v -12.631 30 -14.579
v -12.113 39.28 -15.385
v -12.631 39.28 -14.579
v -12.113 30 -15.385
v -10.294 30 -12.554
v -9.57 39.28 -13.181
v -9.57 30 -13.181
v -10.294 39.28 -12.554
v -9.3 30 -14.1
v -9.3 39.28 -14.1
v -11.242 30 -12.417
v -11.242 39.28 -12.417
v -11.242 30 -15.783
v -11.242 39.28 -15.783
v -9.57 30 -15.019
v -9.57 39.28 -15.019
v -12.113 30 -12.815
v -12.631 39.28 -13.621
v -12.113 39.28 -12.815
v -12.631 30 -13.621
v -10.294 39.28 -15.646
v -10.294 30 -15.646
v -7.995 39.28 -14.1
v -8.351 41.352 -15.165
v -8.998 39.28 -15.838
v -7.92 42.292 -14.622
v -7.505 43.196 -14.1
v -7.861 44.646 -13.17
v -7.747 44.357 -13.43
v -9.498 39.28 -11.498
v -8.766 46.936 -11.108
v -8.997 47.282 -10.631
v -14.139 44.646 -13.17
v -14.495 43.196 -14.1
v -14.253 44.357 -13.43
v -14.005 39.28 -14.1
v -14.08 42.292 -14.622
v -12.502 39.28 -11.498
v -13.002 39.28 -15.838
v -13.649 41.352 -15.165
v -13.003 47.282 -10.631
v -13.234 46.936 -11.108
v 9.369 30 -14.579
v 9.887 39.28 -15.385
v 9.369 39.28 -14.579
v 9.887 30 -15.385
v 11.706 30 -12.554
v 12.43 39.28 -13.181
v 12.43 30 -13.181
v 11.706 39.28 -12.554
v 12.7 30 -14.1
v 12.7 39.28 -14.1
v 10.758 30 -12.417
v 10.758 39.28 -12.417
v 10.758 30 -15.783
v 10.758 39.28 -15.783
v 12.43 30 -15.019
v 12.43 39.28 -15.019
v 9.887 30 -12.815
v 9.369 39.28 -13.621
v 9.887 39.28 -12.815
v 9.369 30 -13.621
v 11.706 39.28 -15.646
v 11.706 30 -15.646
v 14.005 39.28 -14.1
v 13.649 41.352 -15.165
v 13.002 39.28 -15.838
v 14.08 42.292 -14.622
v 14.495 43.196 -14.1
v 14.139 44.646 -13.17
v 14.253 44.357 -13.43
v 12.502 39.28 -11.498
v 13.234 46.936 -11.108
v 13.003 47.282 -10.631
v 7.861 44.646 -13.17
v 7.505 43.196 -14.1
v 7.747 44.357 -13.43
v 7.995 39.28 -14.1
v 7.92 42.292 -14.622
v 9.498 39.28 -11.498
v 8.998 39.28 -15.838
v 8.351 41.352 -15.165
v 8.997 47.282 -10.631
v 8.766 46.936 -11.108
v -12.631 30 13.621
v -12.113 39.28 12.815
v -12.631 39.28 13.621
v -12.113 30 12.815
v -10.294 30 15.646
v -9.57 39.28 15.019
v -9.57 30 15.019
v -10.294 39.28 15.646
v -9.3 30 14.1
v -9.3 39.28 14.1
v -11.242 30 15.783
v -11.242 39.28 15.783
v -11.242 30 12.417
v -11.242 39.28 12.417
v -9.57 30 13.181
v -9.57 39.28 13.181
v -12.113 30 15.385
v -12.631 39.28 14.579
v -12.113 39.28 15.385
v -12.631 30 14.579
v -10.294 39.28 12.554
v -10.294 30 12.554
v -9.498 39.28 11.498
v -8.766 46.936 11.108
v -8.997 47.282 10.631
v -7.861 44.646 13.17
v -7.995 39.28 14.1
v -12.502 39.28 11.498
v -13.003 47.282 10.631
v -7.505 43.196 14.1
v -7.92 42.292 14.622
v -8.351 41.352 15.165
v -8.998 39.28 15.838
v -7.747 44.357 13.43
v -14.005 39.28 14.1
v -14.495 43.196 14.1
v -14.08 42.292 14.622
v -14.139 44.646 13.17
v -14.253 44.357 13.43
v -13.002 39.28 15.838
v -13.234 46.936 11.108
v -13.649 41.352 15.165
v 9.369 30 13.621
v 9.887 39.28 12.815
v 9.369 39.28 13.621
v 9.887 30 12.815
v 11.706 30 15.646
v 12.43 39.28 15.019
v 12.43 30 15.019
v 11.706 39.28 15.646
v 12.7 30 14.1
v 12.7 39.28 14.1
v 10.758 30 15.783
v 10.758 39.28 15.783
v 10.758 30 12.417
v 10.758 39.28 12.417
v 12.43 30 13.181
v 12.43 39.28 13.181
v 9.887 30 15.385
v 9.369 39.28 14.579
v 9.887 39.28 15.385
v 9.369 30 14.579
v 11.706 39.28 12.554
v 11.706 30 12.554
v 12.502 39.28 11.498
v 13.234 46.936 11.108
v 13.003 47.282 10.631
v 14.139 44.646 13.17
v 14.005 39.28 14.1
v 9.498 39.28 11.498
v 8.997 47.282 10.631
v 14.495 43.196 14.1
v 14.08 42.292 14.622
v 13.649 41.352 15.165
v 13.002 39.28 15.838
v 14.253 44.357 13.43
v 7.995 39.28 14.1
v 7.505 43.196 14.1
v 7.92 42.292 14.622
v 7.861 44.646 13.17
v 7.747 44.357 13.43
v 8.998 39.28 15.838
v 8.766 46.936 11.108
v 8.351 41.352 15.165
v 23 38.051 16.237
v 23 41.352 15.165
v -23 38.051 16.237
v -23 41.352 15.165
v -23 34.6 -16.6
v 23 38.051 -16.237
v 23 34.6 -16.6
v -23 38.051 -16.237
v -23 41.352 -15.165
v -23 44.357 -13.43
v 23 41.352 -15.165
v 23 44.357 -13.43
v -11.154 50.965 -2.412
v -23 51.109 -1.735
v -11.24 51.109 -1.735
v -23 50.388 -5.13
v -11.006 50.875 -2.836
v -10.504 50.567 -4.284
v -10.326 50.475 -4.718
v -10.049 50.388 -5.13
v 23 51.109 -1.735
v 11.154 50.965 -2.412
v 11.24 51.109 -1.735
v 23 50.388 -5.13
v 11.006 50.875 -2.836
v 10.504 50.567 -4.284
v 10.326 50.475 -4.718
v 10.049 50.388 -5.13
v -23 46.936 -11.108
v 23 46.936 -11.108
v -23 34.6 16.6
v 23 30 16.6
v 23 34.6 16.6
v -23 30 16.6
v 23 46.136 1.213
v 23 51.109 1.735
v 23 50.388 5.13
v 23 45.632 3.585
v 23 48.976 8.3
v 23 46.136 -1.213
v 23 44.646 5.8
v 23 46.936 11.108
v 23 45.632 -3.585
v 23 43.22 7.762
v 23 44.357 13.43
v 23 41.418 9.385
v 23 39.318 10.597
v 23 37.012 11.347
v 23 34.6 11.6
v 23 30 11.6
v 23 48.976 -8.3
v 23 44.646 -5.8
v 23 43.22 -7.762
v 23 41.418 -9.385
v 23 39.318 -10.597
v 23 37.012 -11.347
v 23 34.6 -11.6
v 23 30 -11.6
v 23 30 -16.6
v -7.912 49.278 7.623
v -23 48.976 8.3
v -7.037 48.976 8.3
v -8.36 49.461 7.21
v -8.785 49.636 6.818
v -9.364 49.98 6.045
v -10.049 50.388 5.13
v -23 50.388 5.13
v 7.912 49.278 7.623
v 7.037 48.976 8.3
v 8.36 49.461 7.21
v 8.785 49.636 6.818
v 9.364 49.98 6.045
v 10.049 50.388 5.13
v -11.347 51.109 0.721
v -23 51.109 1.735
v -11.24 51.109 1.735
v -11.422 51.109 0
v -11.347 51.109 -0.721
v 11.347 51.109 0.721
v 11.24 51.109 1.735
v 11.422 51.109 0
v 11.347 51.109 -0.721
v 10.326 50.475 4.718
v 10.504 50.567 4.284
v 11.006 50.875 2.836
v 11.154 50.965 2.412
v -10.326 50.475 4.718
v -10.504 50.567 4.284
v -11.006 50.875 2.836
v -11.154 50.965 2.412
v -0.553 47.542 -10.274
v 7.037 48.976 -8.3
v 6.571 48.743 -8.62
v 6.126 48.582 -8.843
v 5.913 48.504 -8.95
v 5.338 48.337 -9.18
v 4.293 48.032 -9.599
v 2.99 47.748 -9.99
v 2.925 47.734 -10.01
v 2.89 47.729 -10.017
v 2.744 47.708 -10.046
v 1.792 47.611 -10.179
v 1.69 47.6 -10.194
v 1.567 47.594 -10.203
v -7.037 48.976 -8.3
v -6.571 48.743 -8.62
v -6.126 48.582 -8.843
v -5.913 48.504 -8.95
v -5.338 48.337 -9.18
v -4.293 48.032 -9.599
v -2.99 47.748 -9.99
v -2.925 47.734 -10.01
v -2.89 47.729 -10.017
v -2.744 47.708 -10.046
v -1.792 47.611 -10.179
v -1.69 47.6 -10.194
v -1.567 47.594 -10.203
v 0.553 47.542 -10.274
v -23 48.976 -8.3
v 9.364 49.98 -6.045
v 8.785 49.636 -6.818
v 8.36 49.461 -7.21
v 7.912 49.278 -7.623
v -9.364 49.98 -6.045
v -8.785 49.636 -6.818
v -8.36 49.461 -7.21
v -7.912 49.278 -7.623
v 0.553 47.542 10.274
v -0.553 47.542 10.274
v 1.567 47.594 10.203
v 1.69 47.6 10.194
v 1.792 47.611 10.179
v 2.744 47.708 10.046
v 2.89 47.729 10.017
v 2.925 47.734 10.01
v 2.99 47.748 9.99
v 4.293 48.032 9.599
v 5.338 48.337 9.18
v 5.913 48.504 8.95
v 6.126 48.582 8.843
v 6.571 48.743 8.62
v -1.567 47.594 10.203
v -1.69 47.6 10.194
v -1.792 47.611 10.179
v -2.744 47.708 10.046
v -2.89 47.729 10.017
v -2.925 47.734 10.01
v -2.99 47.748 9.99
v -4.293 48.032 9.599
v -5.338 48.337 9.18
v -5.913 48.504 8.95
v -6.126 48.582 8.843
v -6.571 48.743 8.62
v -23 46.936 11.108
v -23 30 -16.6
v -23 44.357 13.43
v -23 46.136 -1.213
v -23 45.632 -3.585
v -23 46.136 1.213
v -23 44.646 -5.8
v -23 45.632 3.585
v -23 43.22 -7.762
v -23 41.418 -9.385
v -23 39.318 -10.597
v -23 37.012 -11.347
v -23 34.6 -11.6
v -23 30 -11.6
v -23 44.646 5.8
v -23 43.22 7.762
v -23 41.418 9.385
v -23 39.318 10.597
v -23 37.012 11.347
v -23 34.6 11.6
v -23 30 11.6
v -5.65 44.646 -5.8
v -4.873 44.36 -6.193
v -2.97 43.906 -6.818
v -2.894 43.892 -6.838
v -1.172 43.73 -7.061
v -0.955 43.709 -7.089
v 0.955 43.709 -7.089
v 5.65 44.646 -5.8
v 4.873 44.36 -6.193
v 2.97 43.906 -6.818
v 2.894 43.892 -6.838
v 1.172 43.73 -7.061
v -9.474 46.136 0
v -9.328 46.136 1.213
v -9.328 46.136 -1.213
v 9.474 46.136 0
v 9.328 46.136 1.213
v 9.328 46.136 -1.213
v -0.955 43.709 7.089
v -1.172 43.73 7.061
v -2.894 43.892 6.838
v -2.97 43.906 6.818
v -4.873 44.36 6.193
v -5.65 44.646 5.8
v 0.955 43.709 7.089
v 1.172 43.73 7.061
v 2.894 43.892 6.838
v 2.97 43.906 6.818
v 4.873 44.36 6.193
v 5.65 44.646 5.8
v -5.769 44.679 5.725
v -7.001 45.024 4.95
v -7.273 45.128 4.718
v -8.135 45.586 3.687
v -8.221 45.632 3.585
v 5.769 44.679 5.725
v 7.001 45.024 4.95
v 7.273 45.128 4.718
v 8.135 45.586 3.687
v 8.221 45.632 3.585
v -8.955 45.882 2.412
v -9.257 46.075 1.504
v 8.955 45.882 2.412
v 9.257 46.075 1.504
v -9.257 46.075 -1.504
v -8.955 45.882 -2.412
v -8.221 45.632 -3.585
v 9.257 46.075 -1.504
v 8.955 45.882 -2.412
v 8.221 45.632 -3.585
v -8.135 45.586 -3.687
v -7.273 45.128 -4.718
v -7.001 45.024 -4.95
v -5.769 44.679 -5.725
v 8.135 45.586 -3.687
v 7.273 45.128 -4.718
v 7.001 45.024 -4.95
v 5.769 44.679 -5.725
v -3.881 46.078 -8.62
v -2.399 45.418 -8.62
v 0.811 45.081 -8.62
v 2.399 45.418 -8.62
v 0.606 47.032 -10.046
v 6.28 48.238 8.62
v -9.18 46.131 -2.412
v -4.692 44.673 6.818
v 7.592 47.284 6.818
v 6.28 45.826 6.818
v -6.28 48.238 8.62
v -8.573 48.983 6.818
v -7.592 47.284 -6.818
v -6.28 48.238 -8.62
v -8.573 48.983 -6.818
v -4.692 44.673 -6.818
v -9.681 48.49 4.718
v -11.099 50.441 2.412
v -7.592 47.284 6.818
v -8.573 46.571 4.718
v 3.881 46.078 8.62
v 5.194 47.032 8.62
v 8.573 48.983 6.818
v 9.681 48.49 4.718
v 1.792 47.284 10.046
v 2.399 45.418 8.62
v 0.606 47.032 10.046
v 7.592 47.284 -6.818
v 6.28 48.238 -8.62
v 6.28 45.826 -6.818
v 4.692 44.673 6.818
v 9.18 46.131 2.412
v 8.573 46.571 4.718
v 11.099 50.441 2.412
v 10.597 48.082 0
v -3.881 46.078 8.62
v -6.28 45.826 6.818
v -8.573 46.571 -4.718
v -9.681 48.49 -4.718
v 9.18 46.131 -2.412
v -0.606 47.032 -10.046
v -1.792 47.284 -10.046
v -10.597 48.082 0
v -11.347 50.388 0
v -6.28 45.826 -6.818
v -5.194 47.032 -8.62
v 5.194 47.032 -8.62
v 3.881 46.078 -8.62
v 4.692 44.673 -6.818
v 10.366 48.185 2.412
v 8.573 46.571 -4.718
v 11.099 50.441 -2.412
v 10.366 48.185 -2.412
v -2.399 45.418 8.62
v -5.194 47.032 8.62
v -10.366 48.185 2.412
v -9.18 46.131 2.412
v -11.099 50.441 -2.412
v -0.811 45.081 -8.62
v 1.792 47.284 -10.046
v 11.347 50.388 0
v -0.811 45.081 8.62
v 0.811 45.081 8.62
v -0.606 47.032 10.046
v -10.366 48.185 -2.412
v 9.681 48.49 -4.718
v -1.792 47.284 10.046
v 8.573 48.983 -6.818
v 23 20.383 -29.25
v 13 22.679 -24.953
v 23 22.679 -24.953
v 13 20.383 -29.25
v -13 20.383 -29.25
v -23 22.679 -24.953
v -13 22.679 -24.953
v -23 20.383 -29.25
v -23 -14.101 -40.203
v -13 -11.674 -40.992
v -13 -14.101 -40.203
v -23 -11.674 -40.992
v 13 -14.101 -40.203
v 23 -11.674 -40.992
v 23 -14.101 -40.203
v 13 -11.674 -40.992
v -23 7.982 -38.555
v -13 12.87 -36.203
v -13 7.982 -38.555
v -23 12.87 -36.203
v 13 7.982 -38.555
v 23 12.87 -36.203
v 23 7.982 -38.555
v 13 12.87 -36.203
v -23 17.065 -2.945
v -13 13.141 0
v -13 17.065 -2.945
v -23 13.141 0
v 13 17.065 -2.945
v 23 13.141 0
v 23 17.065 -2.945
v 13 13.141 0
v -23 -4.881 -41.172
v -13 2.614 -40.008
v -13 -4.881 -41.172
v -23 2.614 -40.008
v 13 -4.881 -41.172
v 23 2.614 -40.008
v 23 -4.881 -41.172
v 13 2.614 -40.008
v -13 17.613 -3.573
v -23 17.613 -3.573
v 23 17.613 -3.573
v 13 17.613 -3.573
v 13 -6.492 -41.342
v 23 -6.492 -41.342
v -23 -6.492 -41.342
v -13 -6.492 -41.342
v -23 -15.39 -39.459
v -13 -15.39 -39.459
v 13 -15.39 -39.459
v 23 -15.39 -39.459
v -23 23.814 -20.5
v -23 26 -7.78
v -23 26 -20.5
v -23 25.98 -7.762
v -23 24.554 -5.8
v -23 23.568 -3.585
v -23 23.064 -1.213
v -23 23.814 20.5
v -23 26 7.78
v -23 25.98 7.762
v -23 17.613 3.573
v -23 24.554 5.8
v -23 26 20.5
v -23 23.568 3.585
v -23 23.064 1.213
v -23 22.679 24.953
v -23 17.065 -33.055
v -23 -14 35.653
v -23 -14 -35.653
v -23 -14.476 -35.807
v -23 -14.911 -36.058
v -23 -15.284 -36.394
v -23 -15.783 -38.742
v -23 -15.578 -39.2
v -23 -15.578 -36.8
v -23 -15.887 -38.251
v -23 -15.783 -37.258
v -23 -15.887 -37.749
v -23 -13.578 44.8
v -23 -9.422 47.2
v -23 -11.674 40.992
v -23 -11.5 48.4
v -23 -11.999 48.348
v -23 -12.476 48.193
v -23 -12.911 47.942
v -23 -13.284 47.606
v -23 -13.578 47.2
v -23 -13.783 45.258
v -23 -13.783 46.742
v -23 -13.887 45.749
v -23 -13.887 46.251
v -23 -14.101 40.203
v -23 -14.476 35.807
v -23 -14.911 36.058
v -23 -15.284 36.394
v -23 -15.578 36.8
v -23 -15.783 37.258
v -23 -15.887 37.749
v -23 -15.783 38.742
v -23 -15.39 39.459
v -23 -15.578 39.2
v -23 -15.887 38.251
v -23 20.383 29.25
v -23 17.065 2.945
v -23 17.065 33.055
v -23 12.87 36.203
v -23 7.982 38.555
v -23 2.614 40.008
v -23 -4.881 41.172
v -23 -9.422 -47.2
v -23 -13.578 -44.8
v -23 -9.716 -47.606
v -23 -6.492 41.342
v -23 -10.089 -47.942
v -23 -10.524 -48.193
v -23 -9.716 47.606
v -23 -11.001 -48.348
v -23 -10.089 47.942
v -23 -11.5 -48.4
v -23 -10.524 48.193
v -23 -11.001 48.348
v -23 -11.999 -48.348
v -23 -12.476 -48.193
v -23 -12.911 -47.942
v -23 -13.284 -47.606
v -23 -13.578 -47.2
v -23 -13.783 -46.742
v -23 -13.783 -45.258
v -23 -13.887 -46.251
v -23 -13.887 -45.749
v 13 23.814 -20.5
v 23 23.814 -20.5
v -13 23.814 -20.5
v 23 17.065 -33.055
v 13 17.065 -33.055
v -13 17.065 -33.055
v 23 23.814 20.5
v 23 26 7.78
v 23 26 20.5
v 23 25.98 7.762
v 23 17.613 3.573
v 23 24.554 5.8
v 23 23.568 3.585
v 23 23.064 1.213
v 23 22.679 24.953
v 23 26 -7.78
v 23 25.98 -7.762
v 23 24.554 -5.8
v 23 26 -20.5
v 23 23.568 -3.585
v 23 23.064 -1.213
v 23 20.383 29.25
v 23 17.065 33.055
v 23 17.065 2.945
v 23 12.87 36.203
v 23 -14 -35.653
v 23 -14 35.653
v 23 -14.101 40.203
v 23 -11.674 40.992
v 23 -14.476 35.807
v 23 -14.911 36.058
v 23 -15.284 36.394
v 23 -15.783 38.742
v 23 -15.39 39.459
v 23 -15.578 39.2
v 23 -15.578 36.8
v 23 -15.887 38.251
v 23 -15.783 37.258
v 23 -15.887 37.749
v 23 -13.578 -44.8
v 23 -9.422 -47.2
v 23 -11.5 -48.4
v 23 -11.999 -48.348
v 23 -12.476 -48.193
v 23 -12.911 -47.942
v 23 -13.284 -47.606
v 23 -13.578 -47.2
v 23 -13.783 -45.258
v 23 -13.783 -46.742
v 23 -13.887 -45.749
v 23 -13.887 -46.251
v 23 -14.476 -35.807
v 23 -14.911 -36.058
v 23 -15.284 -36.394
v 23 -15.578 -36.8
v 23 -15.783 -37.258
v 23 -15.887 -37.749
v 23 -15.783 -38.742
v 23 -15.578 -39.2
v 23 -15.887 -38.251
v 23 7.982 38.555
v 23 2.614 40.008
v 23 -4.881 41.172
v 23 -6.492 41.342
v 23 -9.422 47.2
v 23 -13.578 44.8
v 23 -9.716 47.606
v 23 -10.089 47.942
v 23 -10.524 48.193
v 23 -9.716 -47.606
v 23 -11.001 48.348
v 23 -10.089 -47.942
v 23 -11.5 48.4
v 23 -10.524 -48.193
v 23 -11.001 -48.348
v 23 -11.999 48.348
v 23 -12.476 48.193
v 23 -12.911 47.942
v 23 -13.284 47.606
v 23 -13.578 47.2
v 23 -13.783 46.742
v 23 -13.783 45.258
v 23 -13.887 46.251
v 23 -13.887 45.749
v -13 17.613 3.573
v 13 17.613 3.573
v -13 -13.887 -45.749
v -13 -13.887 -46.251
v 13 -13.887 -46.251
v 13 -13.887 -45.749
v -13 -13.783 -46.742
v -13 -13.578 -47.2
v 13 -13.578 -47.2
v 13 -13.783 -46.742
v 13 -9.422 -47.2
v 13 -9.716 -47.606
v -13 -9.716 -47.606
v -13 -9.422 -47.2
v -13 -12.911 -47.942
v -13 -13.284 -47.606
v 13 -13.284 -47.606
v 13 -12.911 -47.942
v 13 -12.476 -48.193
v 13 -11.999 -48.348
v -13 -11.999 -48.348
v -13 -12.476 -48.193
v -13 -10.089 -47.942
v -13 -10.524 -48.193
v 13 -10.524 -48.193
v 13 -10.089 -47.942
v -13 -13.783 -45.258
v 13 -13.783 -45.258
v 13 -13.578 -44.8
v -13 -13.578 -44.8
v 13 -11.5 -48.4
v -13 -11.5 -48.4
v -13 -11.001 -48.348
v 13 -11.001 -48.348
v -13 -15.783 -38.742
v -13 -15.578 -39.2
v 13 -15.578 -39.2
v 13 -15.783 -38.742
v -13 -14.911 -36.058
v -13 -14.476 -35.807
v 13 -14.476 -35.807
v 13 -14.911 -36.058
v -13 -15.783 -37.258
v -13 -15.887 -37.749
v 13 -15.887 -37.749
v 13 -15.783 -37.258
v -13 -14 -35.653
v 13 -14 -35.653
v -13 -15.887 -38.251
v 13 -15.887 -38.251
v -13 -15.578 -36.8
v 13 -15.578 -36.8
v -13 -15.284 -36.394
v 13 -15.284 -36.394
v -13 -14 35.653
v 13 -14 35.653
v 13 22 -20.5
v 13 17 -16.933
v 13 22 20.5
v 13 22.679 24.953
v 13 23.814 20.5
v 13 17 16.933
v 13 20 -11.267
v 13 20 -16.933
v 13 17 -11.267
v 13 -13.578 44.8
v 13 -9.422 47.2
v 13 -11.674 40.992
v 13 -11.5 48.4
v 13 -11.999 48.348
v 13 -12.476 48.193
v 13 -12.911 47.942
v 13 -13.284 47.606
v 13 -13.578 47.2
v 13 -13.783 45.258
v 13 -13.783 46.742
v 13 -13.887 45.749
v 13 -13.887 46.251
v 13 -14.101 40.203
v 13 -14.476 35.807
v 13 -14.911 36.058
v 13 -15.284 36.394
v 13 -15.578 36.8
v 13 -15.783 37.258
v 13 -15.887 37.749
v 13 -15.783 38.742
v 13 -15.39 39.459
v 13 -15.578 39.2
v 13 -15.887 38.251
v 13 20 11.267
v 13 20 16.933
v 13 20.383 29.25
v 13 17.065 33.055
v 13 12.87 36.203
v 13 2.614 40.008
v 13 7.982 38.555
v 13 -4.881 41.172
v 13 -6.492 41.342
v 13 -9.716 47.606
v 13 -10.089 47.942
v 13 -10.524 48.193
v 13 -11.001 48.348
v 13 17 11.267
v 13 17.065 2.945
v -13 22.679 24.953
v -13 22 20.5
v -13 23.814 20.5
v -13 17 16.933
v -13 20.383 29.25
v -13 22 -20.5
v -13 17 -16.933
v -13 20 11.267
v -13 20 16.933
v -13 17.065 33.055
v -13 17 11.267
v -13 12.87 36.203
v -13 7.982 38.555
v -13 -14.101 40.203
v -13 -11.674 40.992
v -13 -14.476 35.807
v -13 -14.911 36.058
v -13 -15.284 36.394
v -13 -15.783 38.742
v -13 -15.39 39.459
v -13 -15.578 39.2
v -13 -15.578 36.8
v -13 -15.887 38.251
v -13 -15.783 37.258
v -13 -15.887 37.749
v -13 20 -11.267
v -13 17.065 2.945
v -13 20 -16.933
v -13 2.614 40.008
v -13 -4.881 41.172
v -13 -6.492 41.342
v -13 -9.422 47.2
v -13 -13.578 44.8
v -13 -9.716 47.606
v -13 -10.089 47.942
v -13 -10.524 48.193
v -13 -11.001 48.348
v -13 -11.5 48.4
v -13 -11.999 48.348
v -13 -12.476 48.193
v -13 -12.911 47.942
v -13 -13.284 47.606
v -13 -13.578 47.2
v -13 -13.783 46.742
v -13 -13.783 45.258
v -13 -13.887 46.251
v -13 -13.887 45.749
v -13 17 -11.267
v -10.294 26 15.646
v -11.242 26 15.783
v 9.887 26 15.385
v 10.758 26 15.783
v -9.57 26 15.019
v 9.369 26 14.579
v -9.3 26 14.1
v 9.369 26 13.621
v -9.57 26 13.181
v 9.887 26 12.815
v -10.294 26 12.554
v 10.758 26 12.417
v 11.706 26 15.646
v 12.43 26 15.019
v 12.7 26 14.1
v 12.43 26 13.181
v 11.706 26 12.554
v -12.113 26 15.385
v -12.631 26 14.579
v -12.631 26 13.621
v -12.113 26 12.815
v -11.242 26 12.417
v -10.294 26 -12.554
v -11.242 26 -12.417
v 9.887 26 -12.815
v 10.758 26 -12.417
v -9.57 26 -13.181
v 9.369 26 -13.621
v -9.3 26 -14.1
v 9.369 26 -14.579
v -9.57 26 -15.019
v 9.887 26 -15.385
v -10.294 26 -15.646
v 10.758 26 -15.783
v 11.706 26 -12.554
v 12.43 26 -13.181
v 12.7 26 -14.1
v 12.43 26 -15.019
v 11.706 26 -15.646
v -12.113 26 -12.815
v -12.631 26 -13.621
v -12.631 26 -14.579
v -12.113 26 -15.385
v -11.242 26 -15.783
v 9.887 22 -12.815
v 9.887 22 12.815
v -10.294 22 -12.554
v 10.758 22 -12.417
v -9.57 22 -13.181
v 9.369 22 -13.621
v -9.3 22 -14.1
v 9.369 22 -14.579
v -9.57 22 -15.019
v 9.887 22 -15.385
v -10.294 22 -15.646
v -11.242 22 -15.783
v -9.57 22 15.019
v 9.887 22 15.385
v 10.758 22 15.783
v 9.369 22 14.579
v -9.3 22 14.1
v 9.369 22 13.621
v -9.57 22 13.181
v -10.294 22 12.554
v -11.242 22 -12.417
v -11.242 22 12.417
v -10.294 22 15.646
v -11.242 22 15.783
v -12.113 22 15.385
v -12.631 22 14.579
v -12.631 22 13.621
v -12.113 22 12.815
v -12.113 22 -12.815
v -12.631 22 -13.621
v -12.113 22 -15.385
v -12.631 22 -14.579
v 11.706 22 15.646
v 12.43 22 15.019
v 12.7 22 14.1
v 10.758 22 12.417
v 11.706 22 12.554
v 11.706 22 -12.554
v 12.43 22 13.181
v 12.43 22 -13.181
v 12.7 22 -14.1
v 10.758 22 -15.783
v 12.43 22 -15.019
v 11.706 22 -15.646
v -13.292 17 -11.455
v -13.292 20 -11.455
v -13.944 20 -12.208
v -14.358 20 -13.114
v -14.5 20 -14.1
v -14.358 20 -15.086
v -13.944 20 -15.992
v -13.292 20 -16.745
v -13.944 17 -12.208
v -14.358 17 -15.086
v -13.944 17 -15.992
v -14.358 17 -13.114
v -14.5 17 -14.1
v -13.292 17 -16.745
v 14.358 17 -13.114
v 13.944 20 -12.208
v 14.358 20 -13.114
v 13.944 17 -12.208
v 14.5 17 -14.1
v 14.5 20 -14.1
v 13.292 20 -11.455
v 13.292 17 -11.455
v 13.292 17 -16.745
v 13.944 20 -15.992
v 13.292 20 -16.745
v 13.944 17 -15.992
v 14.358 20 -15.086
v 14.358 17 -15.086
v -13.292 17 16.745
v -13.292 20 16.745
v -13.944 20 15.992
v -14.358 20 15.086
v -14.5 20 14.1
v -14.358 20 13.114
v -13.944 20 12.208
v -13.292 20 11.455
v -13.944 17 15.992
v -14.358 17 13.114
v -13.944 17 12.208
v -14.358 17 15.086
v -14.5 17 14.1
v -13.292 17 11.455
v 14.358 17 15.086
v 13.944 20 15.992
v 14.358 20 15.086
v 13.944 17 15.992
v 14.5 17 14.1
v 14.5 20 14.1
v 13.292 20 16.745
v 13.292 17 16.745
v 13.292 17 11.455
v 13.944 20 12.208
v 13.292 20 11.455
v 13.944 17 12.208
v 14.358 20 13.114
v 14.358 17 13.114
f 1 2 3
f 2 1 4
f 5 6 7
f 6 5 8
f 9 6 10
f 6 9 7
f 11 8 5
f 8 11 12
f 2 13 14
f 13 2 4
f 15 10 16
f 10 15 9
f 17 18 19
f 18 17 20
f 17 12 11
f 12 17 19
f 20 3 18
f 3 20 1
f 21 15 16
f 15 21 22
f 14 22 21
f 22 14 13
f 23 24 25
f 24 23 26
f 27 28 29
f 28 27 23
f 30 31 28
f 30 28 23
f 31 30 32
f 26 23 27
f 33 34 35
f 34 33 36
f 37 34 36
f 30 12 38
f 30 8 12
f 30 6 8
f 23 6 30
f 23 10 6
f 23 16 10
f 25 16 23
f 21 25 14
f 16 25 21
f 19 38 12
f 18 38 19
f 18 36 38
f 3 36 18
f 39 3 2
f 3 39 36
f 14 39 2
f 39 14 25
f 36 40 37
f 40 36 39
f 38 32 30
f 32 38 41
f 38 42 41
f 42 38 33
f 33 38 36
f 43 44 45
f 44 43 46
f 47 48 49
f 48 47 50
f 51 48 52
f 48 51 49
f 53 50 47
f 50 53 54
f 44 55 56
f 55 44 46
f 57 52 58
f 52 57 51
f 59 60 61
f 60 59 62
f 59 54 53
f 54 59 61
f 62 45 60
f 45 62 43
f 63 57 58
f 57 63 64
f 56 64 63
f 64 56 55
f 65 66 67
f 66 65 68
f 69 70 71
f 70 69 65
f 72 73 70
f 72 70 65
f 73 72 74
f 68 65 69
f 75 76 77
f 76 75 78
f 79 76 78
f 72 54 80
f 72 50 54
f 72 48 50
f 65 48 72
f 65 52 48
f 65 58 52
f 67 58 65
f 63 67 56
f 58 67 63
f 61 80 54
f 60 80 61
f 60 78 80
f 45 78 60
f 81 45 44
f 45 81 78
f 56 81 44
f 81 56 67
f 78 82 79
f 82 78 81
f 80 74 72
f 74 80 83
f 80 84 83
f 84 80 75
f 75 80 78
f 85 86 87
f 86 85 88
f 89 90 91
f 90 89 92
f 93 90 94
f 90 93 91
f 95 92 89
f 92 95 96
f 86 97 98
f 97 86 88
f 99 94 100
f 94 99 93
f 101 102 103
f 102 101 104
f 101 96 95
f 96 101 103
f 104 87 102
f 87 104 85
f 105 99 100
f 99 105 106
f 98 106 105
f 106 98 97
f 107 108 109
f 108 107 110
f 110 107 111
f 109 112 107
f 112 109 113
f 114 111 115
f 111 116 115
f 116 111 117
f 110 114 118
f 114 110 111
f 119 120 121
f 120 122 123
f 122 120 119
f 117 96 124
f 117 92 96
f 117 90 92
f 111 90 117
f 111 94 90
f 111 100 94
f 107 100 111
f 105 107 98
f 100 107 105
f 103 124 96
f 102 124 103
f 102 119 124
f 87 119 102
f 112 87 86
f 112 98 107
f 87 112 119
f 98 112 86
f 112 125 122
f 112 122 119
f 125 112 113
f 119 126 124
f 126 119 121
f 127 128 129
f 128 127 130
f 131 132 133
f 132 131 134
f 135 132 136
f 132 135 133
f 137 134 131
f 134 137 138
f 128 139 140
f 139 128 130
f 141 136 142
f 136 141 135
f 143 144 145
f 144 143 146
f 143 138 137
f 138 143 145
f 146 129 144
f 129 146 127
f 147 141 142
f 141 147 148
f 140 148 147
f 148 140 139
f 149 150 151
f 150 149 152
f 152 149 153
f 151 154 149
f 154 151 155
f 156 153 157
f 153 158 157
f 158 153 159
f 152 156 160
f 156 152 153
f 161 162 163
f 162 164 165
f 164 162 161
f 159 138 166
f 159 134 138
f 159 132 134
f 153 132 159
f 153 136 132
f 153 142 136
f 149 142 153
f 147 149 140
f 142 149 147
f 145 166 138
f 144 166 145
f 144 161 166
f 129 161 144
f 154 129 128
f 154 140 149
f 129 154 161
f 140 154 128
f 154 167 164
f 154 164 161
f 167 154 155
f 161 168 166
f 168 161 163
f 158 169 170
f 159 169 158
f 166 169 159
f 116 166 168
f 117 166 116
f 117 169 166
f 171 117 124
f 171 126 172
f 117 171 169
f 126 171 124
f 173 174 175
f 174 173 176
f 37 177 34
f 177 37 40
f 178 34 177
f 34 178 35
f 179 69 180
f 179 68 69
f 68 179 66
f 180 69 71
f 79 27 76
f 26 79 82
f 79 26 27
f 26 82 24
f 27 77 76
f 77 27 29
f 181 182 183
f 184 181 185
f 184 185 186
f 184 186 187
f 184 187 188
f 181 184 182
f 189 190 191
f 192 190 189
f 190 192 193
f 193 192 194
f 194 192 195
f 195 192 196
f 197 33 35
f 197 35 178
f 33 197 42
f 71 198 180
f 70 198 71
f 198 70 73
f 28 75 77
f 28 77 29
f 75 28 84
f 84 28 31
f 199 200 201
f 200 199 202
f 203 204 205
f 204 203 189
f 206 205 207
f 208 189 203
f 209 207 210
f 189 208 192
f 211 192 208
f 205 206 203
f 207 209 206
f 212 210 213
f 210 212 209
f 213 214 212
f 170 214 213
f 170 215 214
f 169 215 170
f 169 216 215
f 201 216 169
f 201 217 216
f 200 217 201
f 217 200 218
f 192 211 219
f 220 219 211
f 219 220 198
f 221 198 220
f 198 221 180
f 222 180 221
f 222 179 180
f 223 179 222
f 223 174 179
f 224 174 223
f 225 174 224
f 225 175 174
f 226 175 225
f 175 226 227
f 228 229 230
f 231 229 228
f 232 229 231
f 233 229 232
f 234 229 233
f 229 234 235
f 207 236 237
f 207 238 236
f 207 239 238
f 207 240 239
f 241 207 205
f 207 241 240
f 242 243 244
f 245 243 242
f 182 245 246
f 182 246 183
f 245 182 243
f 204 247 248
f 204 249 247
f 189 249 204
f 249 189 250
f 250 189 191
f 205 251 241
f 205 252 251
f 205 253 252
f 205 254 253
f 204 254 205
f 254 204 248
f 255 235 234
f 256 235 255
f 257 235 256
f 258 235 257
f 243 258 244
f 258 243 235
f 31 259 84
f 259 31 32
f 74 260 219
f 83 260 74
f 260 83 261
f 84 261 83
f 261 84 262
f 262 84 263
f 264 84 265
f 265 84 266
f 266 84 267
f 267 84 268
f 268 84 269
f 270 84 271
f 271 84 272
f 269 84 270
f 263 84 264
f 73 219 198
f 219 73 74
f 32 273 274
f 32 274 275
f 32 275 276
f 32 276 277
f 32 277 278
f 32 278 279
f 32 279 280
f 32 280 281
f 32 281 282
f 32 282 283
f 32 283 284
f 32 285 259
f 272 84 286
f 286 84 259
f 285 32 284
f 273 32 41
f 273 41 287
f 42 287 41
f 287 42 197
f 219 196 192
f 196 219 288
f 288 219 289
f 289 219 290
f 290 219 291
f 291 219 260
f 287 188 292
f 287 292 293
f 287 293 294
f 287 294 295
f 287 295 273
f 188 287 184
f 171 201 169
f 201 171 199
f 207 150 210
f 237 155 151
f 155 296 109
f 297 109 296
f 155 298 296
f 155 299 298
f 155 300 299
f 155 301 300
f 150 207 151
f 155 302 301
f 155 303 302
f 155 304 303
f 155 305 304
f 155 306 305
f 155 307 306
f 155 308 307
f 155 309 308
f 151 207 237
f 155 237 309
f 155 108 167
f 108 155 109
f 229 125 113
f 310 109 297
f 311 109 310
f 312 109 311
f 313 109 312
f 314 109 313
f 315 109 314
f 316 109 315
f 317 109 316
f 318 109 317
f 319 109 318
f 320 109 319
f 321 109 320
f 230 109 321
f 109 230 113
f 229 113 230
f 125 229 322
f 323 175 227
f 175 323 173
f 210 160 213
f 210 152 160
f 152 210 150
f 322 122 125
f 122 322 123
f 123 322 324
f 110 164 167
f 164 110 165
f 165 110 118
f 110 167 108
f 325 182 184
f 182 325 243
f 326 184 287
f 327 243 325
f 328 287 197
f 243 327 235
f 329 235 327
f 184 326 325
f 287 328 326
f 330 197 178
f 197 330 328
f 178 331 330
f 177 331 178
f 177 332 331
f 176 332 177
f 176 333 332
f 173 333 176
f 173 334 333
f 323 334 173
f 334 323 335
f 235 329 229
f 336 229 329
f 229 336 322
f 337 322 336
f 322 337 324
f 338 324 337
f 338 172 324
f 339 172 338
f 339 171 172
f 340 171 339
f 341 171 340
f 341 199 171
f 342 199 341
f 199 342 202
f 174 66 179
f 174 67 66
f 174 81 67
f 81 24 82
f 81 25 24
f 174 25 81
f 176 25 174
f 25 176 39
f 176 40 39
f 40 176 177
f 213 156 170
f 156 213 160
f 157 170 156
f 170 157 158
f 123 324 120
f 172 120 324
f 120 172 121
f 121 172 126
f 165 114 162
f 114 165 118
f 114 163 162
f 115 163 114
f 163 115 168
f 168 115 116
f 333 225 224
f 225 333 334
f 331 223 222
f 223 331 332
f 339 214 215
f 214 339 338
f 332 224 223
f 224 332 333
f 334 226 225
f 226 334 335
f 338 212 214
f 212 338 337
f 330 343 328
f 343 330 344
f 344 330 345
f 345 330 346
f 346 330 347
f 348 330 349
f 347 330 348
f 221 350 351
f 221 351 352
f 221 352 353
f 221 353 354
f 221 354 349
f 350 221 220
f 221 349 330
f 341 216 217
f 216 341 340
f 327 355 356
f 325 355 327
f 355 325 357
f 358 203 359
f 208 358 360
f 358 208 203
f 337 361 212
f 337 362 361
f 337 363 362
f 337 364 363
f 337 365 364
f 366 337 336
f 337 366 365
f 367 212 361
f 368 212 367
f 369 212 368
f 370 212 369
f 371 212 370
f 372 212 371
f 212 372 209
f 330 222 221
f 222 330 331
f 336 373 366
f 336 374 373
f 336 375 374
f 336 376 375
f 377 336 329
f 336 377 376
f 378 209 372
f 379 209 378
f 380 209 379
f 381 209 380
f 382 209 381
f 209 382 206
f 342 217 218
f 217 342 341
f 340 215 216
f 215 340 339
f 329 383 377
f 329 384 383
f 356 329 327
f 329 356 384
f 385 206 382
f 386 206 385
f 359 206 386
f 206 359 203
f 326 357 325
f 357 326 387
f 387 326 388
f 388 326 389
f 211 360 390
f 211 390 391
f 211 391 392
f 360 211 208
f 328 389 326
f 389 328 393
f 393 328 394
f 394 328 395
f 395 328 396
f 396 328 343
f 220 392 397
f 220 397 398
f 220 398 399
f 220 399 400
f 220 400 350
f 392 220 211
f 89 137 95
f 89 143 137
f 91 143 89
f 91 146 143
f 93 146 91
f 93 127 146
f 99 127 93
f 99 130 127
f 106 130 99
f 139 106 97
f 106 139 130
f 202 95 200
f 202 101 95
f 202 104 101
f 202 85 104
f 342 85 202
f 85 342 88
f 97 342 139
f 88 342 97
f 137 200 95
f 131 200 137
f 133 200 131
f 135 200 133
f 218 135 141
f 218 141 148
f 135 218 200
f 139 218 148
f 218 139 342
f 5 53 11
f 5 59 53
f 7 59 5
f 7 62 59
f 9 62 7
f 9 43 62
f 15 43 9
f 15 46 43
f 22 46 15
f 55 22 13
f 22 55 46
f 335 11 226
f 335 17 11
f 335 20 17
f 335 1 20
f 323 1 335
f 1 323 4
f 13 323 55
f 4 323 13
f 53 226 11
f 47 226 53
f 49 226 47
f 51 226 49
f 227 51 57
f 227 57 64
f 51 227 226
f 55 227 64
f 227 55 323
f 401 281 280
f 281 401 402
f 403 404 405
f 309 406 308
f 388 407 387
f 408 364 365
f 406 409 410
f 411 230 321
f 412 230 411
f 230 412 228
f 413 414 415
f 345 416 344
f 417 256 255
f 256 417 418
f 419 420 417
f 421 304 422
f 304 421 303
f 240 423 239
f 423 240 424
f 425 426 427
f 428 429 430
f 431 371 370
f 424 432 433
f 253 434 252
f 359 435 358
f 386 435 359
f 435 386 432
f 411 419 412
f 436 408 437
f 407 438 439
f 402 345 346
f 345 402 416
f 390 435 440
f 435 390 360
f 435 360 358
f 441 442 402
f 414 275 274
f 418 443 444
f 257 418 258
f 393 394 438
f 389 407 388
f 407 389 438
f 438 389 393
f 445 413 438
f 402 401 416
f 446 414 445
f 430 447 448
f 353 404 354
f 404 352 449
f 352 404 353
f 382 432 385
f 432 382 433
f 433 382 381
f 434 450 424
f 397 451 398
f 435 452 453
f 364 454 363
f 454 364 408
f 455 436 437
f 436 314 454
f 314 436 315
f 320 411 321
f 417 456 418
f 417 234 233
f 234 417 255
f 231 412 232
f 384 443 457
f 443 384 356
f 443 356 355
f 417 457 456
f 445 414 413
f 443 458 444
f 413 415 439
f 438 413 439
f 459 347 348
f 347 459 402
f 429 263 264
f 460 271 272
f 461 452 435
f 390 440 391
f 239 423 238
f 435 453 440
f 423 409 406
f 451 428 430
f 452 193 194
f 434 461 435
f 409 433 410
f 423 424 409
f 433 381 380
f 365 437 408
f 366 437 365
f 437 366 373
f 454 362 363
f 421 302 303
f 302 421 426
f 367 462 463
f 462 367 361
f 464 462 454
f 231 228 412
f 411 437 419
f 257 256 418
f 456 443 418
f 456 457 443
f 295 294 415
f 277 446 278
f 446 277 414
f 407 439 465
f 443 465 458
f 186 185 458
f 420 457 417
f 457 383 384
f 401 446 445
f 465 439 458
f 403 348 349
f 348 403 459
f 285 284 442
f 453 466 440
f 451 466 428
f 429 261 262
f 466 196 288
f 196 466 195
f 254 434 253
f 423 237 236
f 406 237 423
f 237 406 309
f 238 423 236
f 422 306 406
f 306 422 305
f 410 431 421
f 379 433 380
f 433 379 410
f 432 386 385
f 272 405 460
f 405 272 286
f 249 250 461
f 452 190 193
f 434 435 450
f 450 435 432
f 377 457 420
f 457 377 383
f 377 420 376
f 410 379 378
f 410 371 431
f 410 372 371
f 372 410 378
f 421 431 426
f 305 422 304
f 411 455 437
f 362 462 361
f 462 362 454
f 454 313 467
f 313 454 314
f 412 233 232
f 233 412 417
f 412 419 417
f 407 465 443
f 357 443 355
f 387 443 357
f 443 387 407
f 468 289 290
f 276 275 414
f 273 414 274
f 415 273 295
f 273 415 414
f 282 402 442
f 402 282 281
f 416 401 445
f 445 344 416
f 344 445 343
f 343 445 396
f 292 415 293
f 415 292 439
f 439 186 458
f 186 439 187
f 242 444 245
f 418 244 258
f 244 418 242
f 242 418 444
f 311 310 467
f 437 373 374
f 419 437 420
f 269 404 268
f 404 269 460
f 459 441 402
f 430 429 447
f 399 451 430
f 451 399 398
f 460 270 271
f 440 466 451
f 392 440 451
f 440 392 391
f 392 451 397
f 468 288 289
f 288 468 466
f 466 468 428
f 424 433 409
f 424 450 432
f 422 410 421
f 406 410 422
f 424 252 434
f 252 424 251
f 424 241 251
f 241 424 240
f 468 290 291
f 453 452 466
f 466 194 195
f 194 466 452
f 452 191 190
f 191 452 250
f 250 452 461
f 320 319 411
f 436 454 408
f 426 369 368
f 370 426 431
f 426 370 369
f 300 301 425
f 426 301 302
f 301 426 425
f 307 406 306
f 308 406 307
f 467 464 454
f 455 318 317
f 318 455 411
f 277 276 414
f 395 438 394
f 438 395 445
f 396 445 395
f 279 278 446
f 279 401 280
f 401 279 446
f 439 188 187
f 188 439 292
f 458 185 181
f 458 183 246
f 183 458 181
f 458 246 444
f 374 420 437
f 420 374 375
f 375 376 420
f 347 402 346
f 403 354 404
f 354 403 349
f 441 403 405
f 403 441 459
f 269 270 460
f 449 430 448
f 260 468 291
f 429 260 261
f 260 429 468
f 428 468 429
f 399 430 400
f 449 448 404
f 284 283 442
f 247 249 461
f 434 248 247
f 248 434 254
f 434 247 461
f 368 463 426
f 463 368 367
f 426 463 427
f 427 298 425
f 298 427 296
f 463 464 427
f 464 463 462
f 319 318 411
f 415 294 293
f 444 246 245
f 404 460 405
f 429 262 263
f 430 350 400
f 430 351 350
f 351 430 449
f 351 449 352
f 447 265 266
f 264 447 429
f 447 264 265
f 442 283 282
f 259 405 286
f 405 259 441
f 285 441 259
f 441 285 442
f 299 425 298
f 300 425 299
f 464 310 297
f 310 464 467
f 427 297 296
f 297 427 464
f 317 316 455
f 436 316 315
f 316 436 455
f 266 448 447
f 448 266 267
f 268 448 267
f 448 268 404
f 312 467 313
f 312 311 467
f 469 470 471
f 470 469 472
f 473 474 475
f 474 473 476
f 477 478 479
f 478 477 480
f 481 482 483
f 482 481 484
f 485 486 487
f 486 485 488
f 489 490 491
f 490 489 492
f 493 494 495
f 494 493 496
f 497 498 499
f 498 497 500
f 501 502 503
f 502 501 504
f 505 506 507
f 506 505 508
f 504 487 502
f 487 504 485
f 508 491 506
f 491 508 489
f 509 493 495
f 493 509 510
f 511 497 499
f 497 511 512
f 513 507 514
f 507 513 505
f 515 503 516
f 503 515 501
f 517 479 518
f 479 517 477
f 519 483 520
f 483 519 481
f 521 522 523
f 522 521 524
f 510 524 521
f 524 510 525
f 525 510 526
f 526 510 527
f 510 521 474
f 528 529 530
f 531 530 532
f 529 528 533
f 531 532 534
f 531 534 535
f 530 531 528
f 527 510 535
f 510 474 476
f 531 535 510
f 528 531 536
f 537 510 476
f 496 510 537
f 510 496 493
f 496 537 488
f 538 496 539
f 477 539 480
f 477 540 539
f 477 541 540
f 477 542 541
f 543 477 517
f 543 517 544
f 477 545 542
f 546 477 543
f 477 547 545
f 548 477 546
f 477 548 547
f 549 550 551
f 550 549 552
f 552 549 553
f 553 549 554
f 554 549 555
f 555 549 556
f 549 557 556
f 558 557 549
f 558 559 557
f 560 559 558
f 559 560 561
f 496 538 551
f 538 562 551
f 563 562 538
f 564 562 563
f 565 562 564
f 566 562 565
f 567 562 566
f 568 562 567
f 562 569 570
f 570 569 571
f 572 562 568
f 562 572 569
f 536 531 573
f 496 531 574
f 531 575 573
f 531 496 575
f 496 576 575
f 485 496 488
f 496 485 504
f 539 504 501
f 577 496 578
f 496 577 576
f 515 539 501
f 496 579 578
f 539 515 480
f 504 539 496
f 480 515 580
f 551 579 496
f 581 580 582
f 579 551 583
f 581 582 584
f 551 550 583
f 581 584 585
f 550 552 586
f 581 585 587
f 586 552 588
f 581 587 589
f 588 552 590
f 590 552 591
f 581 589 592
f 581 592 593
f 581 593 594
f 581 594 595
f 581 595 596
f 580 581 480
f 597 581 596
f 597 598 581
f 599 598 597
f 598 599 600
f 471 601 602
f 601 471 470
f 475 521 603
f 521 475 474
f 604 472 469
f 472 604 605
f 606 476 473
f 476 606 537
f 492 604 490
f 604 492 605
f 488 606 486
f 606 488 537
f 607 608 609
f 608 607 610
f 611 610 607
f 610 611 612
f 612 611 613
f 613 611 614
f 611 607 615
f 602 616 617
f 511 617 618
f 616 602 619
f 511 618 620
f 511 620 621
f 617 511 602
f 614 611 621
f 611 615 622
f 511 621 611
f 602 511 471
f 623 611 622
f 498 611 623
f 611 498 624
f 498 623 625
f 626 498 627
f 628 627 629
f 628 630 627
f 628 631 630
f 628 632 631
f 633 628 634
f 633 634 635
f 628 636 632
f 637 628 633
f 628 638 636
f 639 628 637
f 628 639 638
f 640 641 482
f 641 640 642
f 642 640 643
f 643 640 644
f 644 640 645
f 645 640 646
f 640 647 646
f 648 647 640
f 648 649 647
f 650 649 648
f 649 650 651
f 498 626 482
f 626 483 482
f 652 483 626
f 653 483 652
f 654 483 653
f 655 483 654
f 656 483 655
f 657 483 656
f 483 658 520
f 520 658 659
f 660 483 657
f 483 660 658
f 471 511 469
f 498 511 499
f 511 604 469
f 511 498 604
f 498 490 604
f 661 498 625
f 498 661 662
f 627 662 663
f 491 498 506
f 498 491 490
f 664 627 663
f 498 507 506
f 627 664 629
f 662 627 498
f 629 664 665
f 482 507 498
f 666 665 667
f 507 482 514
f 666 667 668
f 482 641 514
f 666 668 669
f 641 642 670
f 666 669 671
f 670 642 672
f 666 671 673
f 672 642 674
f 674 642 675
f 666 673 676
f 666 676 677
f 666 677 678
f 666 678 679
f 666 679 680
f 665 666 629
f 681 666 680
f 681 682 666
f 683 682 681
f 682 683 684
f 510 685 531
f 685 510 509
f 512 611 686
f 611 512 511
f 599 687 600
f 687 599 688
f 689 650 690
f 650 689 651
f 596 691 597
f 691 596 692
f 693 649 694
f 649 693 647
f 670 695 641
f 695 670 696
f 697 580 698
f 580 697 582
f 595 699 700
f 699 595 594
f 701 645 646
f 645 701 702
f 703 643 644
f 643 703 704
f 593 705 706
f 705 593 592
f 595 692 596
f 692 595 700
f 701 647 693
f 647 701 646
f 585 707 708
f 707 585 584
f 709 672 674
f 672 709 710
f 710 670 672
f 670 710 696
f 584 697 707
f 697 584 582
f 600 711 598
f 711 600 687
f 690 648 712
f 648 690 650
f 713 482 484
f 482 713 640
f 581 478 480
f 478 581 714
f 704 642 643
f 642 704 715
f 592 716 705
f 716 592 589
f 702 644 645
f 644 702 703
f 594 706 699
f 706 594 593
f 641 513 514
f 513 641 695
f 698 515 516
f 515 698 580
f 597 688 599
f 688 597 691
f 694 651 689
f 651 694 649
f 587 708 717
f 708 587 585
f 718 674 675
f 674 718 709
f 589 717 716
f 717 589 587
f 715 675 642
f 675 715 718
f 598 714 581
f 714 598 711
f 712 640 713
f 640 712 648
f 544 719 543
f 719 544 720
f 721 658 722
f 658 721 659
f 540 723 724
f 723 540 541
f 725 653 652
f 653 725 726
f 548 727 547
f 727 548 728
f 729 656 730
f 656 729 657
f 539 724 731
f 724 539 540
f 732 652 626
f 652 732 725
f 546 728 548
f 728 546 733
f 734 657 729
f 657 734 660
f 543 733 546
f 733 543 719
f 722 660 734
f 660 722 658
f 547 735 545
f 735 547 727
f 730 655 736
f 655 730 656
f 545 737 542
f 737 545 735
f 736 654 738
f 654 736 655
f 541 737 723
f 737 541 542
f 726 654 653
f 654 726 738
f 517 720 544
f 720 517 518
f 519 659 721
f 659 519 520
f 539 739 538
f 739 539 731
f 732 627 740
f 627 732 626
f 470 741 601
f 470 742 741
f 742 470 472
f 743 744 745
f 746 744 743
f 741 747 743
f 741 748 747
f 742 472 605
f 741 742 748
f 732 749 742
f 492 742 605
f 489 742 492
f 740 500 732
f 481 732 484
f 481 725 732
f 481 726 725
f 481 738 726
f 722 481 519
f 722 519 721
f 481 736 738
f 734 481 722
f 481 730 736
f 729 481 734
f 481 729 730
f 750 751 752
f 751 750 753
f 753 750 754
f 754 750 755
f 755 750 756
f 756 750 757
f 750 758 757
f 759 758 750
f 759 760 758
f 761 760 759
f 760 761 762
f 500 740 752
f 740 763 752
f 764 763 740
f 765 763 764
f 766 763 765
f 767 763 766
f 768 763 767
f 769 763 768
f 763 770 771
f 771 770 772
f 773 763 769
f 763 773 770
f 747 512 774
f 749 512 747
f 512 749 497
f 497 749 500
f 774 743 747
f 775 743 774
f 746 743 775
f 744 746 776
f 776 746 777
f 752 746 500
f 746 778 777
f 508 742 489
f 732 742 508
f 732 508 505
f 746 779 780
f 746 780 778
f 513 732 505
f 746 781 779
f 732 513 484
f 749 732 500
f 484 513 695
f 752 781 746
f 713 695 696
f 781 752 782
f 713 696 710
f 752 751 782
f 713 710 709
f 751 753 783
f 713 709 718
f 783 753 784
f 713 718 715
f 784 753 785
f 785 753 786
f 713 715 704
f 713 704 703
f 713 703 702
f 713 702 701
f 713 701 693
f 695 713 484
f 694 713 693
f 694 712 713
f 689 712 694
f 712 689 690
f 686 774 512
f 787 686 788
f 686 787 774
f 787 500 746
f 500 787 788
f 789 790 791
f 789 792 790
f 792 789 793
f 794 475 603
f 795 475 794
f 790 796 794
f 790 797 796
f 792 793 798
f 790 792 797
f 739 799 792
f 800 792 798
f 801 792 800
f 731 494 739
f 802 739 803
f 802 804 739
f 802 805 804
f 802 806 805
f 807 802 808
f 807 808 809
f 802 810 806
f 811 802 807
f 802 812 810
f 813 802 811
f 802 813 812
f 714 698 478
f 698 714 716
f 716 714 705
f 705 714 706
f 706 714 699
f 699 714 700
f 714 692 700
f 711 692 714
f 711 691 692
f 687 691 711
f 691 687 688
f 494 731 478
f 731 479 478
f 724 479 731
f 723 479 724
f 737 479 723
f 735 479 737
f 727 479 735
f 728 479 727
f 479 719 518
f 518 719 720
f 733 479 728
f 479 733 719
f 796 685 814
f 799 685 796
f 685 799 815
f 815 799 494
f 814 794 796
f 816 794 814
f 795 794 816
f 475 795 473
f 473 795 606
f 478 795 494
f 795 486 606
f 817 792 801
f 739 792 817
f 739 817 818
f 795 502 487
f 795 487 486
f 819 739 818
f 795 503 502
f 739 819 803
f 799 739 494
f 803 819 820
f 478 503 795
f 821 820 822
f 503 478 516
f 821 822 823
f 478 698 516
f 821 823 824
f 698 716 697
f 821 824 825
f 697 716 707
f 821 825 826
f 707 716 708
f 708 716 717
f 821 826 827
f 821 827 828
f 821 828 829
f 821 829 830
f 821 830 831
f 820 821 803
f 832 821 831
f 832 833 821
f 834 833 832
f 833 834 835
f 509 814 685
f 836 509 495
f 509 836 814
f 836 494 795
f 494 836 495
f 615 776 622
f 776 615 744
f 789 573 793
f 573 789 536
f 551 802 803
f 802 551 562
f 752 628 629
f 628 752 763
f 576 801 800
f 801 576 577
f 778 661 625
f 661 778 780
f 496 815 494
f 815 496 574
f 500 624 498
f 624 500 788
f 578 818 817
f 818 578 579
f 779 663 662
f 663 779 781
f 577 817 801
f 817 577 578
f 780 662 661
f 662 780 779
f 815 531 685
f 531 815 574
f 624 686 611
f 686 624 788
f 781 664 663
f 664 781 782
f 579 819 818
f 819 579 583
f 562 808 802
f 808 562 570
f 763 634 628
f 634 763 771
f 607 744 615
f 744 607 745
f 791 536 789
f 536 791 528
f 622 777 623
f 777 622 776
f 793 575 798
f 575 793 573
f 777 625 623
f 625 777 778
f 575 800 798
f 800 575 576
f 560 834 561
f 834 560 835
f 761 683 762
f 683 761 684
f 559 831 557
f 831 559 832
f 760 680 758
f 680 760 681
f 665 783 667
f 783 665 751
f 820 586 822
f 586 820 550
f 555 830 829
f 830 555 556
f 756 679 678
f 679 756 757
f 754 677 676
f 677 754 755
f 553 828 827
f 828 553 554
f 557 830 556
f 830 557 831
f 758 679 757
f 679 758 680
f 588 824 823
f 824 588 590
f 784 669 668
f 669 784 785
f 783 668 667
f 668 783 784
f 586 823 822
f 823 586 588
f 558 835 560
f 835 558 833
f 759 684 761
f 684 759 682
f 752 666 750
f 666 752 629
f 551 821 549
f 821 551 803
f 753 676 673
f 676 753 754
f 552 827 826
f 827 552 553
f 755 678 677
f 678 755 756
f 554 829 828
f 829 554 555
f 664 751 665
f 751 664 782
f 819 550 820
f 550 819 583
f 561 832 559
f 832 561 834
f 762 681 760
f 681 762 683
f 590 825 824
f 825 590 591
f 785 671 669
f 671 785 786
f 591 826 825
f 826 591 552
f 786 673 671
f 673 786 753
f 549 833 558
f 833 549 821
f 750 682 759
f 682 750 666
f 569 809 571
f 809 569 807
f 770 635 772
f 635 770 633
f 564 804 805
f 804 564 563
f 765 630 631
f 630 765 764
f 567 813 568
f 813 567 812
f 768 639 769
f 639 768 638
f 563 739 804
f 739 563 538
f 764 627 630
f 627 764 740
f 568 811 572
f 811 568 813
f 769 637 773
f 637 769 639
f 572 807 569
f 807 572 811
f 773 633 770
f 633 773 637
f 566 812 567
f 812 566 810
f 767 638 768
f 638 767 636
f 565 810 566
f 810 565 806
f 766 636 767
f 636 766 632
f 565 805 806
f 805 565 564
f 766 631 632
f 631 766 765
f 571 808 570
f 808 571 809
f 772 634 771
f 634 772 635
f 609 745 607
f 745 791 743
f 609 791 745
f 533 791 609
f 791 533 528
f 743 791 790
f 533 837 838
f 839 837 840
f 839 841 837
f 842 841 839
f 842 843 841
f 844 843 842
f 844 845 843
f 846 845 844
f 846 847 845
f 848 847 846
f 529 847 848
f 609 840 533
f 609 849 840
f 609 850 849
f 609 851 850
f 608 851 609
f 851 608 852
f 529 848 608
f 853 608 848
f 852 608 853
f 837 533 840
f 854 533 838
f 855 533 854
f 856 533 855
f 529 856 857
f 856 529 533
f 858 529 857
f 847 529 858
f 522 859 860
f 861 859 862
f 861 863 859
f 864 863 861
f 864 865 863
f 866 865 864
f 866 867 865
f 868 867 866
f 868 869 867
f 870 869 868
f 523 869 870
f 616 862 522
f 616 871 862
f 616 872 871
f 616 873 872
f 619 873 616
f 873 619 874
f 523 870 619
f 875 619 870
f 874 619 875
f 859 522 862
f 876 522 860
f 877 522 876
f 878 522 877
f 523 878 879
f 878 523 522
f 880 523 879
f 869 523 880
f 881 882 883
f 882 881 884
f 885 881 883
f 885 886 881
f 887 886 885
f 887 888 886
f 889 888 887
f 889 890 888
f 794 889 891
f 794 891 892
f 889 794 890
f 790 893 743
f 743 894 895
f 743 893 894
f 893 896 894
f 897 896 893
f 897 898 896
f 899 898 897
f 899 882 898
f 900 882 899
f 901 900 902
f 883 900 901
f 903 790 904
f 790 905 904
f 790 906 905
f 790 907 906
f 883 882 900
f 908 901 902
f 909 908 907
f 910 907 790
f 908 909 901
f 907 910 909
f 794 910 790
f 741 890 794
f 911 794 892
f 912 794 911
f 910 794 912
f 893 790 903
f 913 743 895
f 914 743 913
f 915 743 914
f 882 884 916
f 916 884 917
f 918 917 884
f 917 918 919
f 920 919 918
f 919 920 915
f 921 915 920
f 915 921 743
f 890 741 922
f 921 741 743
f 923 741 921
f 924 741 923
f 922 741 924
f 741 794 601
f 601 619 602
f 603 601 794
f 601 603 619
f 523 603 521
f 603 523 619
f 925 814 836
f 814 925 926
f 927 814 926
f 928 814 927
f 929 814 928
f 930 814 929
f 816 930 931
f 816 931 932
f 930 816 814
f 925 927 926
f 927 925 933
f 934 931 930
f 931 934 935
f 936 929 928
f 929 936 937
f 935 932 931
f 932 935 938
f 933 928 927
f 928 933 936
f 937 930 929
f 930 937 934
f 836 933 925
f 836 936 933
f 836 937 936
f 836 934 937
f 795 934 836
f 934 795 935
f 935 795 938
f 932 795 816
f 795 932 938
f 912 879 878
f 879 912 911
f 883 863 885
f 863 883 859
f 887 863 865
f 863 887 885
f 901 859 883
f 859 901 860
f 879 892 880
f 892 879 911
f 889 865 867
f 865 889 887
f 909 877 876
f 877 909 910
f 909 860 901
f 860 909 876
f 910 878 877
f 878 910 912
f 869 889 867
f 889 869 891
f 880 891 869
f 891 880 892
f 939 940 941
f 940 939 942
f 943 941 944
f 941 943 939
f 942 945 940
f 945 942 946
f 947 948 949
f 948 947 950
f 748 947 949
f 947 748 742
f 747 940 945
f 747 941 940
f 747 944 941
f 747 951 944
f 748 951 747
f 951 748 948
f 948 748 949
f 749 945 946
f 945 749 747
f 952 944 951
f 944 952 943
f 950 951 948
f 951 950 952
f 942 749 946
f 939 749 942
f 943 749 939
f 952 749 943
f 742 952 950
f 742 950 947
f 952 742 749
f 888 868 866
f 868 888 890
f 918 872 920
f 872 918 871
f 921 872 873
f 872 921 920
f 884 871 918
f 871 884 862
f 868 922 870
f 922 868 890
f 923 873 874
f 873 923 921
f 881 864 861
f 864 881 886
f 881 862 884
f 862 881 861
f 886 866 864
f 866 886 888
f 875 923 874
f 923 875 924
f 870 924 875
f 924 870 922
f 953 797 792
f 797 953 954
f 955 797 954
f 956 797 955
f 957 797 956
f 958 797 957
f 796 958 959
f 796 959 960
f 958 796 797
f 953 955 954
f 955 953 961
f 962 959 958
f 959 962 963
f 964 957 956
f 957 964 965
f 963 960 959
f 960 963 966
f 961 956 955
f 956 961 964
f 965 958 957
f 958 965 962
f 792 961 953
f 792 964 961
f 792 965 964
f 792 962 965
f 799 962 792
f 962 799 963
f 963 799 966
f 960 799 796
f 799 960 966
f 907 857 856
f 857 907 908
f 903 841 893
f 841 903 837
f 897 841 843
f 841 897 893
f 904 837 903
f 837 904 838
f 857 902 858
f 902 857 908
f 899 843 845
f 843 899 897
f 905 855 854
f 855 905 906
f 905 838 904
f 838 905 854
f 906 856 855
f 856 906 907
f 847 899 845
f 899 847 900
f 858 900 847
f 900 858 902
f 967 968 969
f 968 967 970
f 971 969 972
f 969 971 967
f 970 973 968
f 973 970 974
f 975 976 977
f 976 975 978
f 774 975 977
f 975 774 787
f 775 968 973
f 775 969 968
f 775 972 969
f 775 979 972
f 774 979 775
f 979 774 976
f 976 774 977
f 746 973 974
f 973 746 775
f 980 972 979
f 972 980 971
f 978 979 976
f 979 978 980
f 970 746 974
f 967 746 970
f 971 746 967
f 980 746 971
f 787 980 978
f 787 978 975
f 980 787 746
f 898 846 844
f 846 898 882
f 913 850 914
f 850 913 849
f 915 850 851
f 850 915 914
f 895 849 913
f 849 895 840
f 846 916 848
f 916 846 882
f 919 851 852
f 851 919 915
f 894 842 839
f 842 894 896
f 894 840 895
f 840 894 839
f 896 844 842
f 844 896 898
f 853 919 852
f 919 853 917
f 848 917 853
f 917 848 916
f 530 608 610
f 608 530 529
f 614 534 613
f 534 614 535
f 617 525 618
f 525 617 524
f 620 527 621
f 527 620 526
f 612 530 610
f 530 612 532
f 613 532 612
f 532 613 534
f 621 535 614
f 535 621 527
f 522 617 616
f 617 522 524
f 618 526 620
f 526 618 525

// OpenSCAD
// [FL_INDEX: keywords="openscad, 3d_parametric, Handlebar___tube_mount_for_Garmin_Montana_600_family, csg_solid" | COT="Parametric OpenSCAD design from 3DCodeverse"]
// Title: Handlebar / tube mount for Garmin Montana 600 family 

// Set to "no" for printing:
print_it=0; // [1:yes,0:no]

// Print one "nut" and two "arm"s:
what="both"; // [both,nut,arm]

// Handlebar diameter:
handlebar_d=23.2;


//
// Handlebar support for Garmin Montana GPS - Rev 1.01
//
// CC-BY-NC 2013 by Jeremie.Francois@gmail.com / MoonCactus on thingiverse
// http://betterprinter.blogspot.com
//
// It slices neatly on an ultimaker with the following parameters
//
// 0.2 mm layers
// 1.8 mm walls (loops->infill->perimeters)
// 1.2mm bottom/top
// 30% fill
// 

// handlebar_d: [15:32]

// decathlon rockrider 500 = 23.2

tol=0+0.1;

// Main thickness
th= 0+4;
hnut_th= 0+5;

hook_x=0+19; // from center
hook_y=0+19-0.8; // 19mm from screen towards the back
hook_z=0+34 + 1.2; // from center// V1 was "1"

hook_szx= 0+8;
hook_szy= 0+2.8; // v1 was 2
hook_szz= 0+3;

arm_th= 0+6;

gps_szx= 0+145;
gps_szy= 0+37;
gps_szz= 0+75;

// How far is the handlebar (display only)
handle_y= 19+th + handlebar_d/2;


module body(w,h, margin)
{
	color([1,1,0])
	{
		scale([1,1.02,1])
		translate([-2,-2.1-0.6,-w/2]) linear_extrude(height=w) scale(0.192) import(file = "montana_large.dxf");

		rotate([0,90,0])
		translate([0.32,-0.45,-h/2])
		rotate([0,0,0.7]) linear_extrude(height=h) scale([0.08,0.082,0.08]) import(file = "montana_short.dxf");
	}
}

module ccyl(r,h, rot=[0,0,0])
{
	rotate(rot) translate([0,0,-h/2]) cylinder(r=r,h=h, $fs=0.5);
}



// hook
module hook()
{
	color([1,0.5,0.5])
		translate([0,-gps_szy/2, 0])
		{
			translate([hook_x,hook_y,hook_z])
			{
				hull()
				{
					ccyl(r=hook_szy/2, h=hook_szx, rot=[0,90,0]);
					translate([0,0,hook_szz]) ccyl(r=hook_szy/2, h=hook_szx, rot=[0,90,0]);
				}
			}
		}
}

module back_plate()
{
	hull()
	{
		translate([0,20,20]) rotate([0,90,0]) ccyl(r=2.4,h=arm_totszx,$fs=1);
		translate([0,20,0]) rotate([0,90,0]) ccyl(r=2.4,h=arm_totszx,$fs=1);
	}
}

arm_totszx= hook_x*2 + hook_szx;
module roundedarmtop()
{
	difference()
	{
		intersection()
		{
			union()
			{
				hull()
				{
//					translate([2,1,gps_szy- gps_szy/2-0.5]) rotate([0,90,0]) ccyl(r=gps_szy/2+th, h=arm_totszx);
				scale([1,1.2,1])
					translate([0,-2.5,gps_szy- gps_szy/2-0.5])
						rotate([0,90,0]) ccyl(r=gps_szy/2+th, h=arm_totszx);
					translate([0,-8,34- 15/2])
						rotate([0,90,0]) ccyl(r=15, h=arm_totszx);
				}
				back_plate();

				// protruding bit to open the arms
				hull()
				{
					translate([0,-13.5+2,gps_szz-37+8])
						rotate([0,90,0]) ccyl(r=2.4,h=arm_totszx,$fs=1);
					translate([0,-13.5+5,gps_szz-37+2])
						rotate([0,90,0]) ccyl(r=2.4,h=arm_totszx,$fs=1);
				}

			}
			union()
			{
				translate([0,-13.5,gps_szz-37]) rotate([0,90,0]) ccyl(r=2.4,h=100,$fs=1);
				translate([-50,-14,-tol]) cube([100,50,100]);
			}
		}
		body(1,gps_szx-80, 3); // remove on X axis
	}
}

// viewed from the back
module arm_half()
{
	difference()
	{
		roundedarmtop();
		// cut them in half
		cube([hook_x*2 - arm_th*2,gps_szy+th*4+tol,gps_szz+th*2+tol+20],center=true);
	}
}

module arms()
{
	for(mz=[-1:+1])
	{
		scale([1,1,mz])
		{
			arm_half();
			hook(); scale([-1,1,1]) hook();
		}
	}
}


module handlebar()
{
	translate([0,handle_y,0])
		rotate([0,90,0])
			ccyl(r=handlebar_d/2,h=100);
}

module back()
{
	// Back plate
	difference()
	{
		hull()
		{
			intersection()
			{
				union() { back_plate(); scale([1,1,-1]) back_plate(); }
				body(1,gps_szx-80, 3); // remove on X axis
			}
			translate([0,20+th,0]) cube([arm_totszx,th,41],center=true);
		}
	}
}

module fullgrip()
{
	difference()
	{
		union()
		{
			arms();
			back();
		}

		// screw holes
		screwset("onlyscrews");
		handlebar();
	}
}



module screw()
{
	cylinder(r=6/2+0.5, h=3, $fs=1); // screw head
	cylinder(r=3/2+0.2, h=30, $fs=1); // screw head
}

module screwset(what="onlyscrews")
{
	for(sz=[-1:2:1])
		for(sx=[-1:2:1])
			translate([11*sx,17,(handlebar_d/2+hnut_th/2)*sz])
				for(mz=[-1:1])
					scale([1,1,mz])
						rotate([-90,0,0])
		{
			screw();
			if(what!="onlyscrews")
				translate([0,0,handle_y-handlebar_d/2-10 + handlebar_d*0.4])
					cylinder(r1=6.01/2,r2=6.01/2+5,h=40,$fn=6);
		}
}


module handle_nut()
{
	difference()
	{
		hull()
		{
			translate([0,handle_y,0])
			{
				rotate([0,90,0])
					ccyl(r=handlebar_d/2+hnut_th, h=arm_totszx);

				translate([0,-handlebar_d/2,0])
					cube([arm_totszx,tol,handlebar_d+hnut_th*2],center=true);
			}
		}
		screwset("nuts");
		hull()
		{
			handlebar();
			translate([0,-20,0]) handlebar();
		}
		translate([0,handle_y-handlebar_d/2-10,0])
			cube([arm_totszx+tol,34,gps_szz],center=true);
		translate([0,handle_y+handlebar_d-hnut_th,0])
			sphere(r=handlebar_d/2);
	}
}


if(what=="nut" || what=="both")
{
	rotate([0,print_it?90:0,0]) // uncomment this to lay it flat for printing
		handle_nut();
}

if(what=="arm" || what=="both")
{
	rotate([0,print_it?90:0,0])
	intersection()
	{
		fullgrip();
		if(print_it)
			translate([0,-50,-50]) cube([100,100,100]); // only half of the stuff
	}
}
// %cube([gps_szx,gps_szy,gps_szz],center=true); // ghost of the device
